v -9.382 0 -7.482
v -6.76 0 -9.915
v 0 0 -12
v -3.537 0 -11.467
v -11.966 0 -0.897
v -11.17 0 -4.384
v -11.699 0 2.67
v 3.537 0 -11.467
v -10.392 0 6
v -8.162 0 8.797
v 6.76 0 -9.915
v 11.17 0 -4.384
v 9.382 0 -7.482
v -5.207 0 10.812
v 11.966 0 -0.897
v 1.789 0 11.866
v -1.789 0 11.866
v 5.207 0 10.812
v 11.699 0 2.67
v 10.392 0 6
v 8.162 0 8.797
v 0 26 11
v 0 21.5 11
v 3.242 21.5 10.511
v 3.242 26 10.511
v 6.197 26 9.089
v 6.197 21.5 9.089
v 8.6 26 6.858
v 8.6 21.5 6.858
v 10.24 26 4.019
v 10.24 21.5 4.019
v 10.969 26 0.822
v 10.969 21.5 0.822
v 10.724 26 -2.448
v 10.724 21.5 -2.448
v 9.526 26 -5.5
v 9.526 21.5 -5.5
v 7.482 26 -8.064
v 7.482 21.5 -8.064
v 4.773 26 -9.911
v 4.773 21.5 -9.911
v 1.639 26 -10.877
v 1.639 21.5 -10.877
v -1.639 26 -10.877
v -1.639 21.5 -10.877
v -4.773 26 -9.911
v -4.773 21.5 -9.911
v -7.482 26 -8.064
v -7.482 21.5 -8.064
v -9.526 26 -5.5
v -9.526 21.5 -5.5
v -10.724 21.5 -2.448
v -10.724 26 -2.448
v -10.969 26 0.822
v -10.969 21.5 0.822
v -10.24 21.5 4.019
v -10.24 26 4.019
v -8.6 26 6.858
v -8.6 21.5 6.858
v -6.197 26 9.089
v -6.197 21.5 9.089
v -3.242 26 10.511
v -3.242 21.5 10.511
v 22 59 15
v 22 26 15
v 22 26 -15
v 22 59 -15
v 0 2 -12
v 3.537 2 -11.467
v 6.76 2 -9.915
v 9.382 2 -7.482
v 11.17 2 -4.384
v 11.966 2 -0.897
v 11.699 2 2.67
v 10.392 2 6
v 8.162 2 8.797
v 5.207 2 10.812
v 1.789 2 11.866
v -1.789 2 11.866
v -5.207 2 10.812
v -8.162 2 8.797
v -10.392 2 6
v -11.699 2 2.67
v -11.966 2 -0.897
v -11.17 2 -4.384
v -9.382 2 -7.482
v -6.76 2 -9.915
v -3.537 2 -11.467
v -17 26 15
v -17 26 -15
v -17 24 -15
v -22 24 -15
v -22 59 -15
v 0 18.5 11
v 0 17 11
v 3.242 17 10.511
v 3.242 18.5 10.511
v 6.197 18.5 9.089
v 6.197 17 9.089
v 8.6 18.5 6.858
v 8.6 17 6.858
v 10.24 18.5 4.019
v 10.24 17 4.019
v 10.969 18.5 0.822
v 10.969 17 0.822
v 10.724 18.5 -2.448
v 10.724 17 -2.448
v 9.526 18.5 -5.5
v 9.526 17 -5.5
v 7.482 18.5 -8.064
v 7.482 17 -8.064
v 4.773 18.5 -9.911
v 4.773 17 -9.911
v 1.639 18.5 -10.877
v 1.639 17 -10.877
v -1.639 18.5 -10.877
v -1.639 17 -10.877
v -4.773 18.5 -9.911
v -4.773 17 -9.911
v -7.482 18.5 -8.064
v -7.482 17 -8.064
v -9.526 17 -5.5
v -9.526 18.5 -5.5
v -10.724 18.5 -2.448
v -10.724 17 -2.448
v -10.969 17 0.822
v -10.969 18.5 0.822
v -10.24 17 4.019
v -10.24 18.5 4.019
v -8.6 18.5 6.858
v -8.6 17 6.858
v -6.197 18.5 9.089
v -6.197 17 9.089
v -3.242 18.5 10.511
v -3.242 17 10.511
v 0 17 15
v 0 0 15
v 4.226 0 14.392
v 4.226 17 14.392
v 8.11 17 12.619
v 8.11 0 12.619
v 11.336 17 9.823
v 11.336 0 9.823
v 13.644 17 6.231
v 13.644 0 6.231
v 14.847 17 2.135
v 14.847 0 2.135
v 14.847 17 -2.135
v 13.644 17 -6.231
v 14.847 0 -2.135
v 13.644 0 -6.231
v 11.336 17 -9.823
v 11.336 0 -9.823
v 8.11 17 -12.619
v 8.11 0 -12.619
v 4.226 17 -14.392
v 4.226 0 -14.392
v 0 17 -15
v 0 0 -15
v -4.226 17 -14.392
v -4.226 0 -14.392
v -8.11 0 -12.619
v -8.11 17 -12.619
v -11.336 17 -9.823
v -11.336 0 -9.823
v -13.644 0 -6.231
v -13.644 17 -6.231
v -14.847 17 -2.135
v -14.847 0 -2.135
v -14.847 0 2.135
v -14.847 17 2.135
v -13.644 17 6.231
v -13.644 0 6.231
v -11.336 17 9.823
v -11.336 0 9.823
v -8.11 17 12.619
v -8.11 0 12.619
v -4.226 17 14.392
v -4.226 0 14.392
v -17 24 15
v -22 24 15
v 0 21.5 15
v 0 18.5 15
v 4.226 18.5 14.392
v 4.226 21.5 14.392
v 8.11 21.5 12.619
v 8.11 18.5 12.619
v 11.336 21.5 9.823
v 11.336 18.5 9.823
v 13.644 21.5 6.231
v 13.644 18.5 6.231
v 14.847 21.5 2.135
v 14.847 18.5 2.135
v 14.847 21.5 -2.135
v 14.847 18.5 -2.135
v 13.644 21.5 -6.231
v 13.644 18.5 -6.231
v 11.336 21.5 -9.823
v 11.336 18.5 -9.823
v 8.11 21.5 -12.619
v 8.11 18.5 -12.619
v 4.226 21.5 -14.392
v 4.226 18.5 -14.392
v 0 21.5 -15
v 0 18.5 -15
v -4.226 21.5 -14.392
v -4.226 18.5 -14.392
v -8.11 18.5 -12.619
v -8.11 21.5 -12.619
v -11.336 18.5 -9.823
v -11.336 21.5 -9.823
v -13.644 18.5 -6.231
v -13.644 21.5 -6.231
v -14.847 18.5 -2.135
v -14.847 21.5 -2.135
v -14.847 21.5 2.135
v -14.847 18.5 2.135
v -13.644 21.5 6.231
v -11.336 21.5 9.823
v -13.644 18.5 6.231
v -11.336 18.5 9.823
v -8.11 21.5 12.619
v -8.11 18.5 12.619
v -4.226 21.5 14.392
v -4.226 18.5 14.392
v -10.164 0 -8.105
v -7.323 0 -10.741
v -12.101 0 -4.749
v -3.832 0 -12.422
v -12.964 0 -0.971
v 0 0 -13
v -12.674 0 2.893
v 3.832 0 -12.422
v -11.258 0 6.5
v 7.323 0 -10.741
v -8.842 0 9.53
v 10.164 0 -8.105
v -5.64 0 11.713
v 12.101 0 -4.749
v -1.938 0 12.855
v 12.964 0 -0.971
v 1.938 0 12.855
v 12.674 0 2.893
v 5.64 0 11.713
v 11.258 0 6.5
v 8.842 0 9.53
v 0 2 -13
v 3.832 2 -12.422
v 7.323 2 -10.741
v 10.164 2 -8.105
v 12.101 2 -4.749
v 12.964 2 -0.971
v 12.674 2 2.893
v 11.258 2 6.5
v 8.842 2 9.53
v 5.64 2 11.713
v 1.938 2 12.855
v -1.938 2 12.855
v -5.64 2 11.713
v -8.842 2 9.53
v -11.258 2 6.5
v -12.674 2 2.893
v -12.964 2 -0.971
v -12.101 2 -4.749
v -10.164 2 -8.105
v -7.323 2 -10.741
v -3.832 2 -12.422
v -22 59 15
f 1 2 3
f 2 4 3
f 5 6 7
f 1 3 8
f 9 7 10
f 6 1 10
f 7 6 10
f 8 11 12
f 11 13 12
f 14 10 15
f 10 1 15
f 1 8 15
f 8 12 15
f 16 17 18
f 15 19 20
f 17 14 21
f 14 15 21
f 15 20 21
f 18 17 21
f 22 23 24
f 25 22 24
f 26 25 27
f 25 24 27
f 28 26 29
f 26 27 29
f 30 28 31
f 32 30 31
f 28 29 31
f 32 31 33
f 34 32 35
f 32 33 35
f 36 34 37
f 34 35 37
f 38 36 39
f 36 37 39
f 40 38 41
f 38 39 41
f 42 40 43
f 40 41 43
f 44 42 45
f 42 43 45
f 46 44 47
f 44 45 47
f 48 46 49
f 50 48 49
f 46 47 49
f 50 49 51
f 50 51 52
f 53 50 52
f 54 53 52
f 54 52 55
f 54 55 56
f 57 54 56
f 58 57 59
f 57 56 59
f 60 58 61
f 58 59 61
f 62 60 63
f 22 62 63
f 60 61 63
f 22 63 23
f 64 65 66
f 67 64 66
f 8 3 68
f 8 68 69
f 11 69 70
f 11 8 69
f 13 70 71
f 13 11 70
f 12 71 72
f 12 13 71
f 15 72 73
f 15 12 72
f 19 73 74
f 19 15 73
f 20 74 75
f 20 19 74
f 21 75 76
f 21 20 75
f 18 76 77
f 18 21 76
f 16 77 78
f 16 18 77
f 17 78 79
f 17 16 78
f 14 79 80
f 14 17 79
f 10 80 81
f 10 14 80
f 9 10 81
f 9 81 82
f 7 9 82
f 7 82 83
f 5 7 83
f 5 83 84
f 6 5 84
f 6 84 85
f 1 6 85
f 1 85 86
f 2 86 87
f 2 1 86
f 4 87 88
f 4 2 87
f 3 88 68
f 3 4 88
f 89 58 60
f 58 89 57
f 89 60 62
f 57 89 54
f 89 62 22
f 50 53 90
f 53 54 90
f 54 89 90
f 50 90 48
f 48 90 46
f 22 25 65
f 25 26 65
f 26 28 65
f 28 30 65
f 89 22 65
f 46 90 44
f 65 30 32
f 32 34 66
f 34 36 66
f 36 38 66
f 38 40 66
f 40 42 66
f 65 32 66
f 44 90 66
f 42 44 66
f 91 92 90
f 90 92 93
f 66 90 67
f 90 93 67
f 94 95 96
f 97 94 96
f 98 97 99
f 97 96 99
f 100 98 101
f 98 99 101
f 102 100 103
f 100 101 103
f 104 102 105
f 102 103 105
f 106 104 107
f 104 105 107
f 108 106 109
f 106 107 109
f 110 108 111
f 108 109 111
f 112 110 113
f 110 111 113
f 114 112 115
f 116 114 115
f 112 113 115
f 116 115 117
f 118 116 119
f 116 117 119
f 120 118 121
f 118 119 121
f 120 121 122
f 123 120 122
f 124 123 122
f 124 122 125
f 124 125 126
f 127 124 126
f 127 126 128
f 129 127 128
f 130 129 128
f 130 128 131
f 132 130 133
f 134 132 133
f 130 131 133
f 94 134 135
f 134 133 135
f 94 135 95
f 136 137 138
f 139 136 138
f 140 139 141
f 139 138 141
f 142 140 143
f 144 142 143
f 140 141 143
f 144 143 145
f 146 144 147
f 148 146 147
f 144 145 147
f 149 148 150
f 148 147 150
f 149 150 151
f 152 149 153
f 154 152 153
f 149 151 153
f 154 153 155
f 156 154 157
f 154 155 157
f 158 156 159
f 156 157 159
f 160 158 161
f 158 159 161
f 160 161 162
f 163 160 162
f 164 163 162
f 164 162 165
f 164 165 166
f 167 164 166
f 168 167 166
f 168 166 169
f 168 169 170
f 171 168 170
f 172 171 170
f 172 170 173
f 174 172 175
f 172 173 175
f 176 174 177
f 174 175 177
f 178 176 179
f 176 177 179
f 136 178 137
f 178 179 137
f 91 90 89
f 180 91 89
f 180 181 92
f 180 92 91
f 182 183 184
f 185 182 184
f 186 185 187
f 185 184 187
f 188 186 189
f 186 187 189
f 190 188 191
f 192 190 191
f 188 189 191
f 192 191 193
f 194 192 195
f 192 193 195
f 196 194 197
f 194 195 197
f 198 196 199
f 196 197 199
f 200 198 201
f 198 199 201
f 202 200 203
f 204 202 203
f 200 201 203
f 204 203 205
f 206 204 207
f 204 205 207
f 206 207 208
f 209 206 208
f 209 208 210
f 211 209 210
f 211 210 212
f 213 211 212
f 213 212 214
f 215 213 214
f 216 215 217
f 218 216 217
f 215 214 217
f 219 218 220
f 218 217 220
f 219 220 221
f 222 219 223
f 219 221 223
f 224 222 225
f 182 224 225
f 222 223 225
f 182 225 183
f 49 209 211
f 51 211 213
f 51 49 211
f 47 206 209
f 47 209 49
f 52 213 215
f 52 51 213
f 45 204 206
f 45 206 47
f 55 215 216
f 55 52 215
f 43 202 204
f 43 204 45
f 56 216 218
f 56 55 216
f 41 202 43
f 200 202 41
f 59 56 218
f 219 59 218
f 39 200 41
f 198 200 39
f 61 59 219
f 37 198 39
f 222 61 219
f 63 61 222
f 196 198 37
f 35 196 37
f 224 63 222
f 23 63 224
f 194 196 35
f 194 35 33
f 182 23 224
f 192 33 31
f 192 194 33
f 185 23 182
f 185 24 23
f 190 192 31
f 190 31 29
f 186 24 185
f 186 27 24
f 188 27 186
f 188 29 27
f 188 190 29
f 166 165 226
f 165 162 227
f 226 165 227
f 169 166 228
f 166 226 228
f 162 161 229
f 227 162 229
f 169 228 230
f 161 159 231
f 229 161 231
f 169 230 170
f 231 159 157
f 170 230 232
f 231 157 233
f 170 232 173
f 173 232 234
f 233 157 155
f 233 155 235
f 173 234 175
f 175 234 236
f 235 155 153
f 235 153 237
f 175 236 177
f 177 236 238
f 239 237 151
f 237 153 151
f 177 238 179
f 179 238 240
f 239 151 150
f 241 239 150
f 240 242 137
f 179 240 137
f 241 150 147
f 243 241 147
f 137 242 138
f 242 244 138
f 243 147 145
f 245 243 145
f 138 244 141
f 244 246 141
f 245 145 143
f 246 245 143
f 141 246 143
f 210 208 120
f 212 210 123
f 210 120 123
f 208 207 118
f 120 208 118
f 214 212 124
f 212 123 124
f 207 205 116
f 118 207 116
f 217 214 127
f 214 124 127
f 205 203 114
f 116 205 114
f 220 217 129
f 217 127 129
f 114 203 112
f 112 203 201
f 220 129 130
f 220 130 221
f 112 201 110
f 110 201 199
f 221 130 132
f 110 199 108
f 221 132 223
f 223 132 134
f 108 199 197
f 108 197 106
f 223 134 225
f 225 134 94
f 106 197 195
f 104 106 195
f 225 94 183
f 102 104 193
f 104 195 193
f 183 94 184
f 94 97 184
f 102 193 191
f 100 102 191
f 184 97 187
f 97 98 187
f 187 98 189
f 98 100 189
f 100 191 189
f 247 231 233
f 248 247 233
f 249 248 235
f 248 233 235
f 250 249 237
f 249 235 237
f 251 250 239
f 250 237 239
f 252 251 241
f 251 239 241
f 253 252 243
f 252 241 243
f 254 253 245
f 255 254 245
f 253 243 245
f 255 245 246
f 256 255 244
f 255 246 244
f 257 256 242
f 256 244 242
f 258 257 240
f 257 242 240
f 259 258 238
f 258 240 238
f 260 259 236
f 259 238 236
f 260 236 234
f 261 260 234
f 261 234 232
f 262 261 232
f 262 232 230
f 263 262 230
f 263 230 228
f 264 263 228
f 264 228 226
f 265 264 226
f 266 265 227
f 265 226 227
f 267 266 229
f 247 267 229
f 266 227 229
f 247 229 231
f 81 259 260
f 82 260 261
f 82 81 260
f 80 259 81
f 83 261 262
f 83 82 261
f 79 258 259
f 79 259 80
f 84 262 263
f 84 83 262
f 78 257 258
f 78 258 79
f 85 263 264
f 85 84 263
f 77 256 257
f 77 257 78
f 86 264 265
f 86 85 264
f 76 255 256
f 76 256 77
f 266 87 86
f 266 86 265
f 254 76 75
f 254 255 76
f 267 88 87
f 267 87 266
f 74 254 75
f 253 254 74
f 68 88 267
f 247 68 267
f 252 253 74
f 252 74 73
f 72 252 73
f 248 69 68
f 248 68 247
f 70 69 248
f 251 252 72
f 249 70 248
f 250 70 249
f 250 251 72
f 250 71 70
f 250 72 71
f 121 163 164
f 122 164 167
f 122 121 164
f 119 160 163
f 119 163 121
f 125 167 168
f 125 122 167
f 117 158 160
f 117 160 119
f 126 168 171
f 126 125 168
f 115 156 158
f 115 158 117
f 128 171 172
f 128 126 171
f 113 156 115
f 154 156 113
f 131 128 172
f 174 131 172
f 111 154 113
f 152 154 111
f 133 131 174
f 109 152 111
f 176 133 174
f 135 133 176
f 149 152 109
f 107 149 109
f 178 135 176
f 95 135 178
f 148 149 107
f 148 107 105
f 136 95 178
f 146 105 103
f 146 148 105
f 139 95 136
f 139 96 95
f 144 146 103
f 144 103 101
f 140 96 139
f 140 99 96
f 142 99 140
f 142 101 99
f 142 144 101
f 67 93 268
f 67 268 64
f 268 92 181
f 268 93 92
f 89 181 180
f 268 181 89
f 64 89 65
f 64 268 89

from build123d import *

# Parameters (mm, degrees)
SKETCH_1_R          = 15
EXTRUDE_1_DEPTH     = 17
SKETCH_2_R          = 11
EXTRUDE_2_DEPTH     = 1.5
SKETCH_3_R          = 15
EXTRUDE_3_DEPTH     = 3
SKETCH_4_R          = 11
EXTRUDE_4_DEPTH     = 4.5
SKETCH_6_W          = 44
SKETCH_6_H          = 30
EXTRUDE_6_DEPTH     = 33
SKETCH_7_W          = 5
SKETCH_7_H          = 30
EXTRUDE_7_DEPTH     = 2
SKETCH_9_R          = 13
SKETCH_9_R_2        = 12
CUT_EXTRUDE_2_DEPTH = 2


with BuildPart() as part:
    # 草圖1 → 伸長1 (new body)
    with BuildSketch(Plane(origin=(0, 0, 0), x_dir=(1, 0, 0), z_dir=(0, 1, 0))):
        with Locations(Location((0, 0, 0), (0, 0, 270))):
            Circle(SKETCH_1_R)
    extrude(amount=EXTRUDE_1_DEPTH)

    # 草圖2 → 伸長2 (add)
    with BuildSketch(Plane(origin=(0, 17, 0), x_dir=(1, 0, 0), z_dir=(0, 1, 0))):
        with Locations(Location((0, 0, 0), (0, 0, 270))):
            Circle(SKETCH_2_R)
    extrude(amount=EXTRUDE_2_DEPTH)

    # 草圖3 → 伸長3 (add)
    with BuildSketch(Plane(origin=(0, 18.5, 0), x_dir=(1, 0, 0), z_dir=(0, 1, 0))):
        with Locations(Location((0, 0, 0), (0, 0, 270))):
            Circle(SKETCH_3_R)
    extrude(amount=EXTRUDE_3_DEPTH)

    # 草圖4 → 伸長4 (add)
    with BuildSketch(Plane(origin=(0, 21.5, 0), x_dir=(1, 0, 0), z_dir=(0, 1, 0))):
        with Locations(Location((0, 0, 0), (0, 0, 270))):
            Circle(SKETCH_4_R)
    extrude(amount=EXTRUDE_4_DEPTH)

    # 草圖6 → 伸長6 (add)
    with BuildSketch(Plane(origin=(0, 26, 0), x_dir=(1, 0, 0), z_dir=(0, 1, 0))):
        Rectangle(SKETCH_6_W, SKETCH_6_H)
    extrude(amount=EXTRUDE_6_DEPTH)

    # 草圖7 → 伸長7 (add)
    with BuildSketch(Plane.XZ.offset(-26)):
        with Locations((-19.5, 0)):
            Rectangle(SKETCH_7_W, SKETCH_7_H)
    extrude(amount=EXTRUDE_7_DEPTH)

    # 草圖9 → 除料-伸長2 (cut)
    with BuildSketch(Plane.XZ):
        with Locations(Location((0, 0, 0), (0, 0, 270))):
            Circle(SKETCH_9_R)
        with Locations(Location((0, 0, 0), (0, 0, 270))):
            Circle(SKETCH_9_R_2, mode=Mode.SUBTRACT)
    extrude(amount=-CUT_EXTRUDE_2_DEPTH, mode=Mode.SUBTRACT)


solid = part.part
